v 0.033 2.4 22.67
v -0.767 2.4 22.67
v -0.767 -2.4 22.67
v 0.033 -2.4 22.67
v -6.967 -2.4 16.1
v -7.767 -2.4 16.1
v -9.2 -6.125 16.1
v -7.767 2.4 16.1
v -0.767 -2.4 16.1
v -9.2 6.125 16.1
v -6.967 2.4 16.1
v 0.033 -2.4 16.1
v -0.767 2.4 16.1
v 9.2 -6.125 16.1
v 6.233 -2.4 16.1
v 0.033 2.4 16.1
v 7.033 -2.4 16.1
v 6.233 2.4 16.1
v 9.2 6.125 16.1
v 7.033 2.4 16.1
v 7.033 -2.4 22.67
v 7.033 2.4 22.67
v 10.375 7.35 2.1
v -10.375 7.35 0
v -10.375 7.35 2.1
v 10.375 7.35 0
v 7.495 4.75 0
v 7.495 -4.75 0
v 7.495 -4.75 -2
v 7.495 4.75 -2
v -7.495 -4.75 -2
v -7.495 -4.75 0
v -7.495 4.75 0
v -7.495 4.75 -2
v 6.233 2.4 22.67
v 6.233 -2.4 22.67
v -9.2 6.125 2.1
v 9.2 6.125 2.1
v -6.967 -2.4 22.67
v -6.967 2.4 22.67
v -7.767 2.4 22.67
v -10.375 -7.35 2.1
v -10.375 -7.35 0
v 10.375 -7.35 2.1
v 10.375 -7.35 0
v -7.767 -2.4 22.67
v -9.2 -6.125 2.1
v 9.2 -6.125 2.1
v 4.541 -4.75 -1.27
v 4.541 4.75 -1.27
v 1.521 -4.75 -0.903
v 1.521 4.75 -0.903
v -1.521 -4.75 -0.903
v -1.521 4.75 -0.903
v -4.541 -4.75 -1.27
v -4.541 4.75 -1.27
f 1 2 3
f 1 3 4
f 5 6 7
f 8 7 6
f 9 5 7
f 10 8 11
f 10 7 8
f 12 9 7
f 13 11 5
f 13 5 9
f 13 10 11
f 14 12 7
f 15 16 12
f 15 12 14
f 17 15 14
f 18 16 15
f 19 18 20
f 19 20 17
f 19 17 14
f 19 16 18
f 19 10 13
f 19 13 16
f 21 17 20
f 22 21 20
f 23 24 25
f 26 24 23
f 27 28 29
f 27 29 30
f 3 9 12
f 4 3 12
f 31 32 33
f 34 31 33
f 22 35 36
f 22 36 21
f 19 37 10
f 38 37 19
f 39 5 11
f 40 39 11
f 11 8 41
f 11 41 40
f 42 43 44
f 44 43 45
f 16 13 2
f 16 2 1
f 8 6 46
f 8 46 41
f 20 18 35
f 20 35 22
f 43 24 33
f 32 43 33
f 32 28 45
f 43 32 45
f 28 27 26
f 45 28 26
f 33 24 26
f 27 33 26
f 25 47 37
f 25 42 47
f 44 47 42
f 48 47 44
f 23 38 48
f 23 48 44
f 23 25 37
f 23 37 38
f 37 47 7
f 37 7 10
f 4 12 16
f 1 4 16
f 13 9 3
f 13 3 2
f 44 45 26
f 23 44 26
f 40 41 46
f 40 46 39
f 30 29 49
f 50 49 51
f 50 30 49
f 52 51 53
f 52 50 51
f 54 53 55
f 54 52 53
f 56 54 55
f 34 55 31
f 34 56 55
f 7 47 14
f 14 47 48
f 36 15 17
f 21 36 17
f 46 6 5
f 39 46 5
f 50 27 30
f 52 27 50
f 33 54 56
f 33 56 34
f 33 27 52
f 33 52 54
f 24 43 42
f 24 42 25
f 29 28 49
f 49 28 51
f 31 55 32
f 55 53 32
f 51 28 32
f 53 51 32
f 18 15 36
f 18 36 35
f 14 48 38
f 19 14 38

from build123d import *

# Parameters (mm, degrees)
ESQUISSE1_W             = 20.75
ESQUISSE1_H             = 14.7
BOSS_EXTRU_1_DEPTH      = 2.1
ESQUISSE2_W             = 18.4
ESQUISSE2_H             = 12.25
BOSS_EXTRU_2_DEPTH      = 14
ESQUISSE3_W             = 0.8
ESQUISSE3_H             = 4.8
BOSS_EXTRU_3_DEPTH      = 6.57
ESQUISSE4_W             = 14.99
ESQUISSE4_H             = 9.5
BOSS_EXTRU_4_DEPTH      = 2
ENL_V_MAT_EXTRU_1_REACH = 29.712


with BuildPart() as part:
    # Esquisse1 → Boss.-Extru.1 (new body)
    with BuildSketch(Plane.XY):
        Rectangle(ESQUISSE1_W, ESQUISSE1_H)
    extrude(amount=BOSS_EXTRU_1_DEPTH)

    # Esquisse2 → Boss.-Extru.2 (add)
    with BuildSketch(Plane.XY.offset(2.1)):
        Rectangle(ESQUISSE2_W, ESQUISSE2_H)
    extrude(amount=BOSS_EXTRU_2_DEPTH)

    # Esquisse3 → Boss.-Extru.3 (add)
    with BuildSketch(Plane.XY.offset(16.1)):
        with Locations((-0.366571113, 0)):
            Rectangle(ESQUISSE3_W, ESQUISSE3_H)
        with Locations((6.633428887, 0)):
            Rectangle(ESQUISSE3_W, ESQUISSE3_H)
        with Locations((-7.366571113, 0)):
            Rectangle(ESQUISSE3_W, ESQUISSE3_H)
    extrude(amount=BOSS_EXTRU_3_DEPTH)

    # Esquisse4 → Boss.-Extru.4 (add)
    with BuildSketch(Plane(origin=(0, 0, 0), x_dir=(-1, 0, 0), z_dir=(0, 0, -1))):
        Rectangle(ESQUISSE4_W, ESQUISSE4_H)
    extrude(amount=BOSS_EXTRU_4_DEPTH)

    # Esquisse5 → Enlèv. mat.-Extru.1 (cut, up to next)
    with BuildSketch(Plane(origin=(0, 4.75, 0), x_dir=(1, 0, 0), z_dir=(0, 1, 0)), mode=Mode.PRIVATE) as enl_v_mat_extru_1_sk1:
        with BuildLine():
            Line((-7.495, 2), (7.495, 2))
            ThreePointArc((7.495, 2), (0, 0.856909001), (-7.495, 2))
        make_face()
    enl_v_mat_extru_1_tool1 = extrude(enl_v_mat_extru_1_sk1.sketch, amount=-ENL_V_MAT_EXTRU_1_REACH, mode=Mode.PRIVATE) & part.part
    add(enl_v_mat_extru_1_tool1.solids().sort_by_distance((0, 4.75, -1.541861))[0], mode=Mode.SUBTRACT)


solid = part.part
